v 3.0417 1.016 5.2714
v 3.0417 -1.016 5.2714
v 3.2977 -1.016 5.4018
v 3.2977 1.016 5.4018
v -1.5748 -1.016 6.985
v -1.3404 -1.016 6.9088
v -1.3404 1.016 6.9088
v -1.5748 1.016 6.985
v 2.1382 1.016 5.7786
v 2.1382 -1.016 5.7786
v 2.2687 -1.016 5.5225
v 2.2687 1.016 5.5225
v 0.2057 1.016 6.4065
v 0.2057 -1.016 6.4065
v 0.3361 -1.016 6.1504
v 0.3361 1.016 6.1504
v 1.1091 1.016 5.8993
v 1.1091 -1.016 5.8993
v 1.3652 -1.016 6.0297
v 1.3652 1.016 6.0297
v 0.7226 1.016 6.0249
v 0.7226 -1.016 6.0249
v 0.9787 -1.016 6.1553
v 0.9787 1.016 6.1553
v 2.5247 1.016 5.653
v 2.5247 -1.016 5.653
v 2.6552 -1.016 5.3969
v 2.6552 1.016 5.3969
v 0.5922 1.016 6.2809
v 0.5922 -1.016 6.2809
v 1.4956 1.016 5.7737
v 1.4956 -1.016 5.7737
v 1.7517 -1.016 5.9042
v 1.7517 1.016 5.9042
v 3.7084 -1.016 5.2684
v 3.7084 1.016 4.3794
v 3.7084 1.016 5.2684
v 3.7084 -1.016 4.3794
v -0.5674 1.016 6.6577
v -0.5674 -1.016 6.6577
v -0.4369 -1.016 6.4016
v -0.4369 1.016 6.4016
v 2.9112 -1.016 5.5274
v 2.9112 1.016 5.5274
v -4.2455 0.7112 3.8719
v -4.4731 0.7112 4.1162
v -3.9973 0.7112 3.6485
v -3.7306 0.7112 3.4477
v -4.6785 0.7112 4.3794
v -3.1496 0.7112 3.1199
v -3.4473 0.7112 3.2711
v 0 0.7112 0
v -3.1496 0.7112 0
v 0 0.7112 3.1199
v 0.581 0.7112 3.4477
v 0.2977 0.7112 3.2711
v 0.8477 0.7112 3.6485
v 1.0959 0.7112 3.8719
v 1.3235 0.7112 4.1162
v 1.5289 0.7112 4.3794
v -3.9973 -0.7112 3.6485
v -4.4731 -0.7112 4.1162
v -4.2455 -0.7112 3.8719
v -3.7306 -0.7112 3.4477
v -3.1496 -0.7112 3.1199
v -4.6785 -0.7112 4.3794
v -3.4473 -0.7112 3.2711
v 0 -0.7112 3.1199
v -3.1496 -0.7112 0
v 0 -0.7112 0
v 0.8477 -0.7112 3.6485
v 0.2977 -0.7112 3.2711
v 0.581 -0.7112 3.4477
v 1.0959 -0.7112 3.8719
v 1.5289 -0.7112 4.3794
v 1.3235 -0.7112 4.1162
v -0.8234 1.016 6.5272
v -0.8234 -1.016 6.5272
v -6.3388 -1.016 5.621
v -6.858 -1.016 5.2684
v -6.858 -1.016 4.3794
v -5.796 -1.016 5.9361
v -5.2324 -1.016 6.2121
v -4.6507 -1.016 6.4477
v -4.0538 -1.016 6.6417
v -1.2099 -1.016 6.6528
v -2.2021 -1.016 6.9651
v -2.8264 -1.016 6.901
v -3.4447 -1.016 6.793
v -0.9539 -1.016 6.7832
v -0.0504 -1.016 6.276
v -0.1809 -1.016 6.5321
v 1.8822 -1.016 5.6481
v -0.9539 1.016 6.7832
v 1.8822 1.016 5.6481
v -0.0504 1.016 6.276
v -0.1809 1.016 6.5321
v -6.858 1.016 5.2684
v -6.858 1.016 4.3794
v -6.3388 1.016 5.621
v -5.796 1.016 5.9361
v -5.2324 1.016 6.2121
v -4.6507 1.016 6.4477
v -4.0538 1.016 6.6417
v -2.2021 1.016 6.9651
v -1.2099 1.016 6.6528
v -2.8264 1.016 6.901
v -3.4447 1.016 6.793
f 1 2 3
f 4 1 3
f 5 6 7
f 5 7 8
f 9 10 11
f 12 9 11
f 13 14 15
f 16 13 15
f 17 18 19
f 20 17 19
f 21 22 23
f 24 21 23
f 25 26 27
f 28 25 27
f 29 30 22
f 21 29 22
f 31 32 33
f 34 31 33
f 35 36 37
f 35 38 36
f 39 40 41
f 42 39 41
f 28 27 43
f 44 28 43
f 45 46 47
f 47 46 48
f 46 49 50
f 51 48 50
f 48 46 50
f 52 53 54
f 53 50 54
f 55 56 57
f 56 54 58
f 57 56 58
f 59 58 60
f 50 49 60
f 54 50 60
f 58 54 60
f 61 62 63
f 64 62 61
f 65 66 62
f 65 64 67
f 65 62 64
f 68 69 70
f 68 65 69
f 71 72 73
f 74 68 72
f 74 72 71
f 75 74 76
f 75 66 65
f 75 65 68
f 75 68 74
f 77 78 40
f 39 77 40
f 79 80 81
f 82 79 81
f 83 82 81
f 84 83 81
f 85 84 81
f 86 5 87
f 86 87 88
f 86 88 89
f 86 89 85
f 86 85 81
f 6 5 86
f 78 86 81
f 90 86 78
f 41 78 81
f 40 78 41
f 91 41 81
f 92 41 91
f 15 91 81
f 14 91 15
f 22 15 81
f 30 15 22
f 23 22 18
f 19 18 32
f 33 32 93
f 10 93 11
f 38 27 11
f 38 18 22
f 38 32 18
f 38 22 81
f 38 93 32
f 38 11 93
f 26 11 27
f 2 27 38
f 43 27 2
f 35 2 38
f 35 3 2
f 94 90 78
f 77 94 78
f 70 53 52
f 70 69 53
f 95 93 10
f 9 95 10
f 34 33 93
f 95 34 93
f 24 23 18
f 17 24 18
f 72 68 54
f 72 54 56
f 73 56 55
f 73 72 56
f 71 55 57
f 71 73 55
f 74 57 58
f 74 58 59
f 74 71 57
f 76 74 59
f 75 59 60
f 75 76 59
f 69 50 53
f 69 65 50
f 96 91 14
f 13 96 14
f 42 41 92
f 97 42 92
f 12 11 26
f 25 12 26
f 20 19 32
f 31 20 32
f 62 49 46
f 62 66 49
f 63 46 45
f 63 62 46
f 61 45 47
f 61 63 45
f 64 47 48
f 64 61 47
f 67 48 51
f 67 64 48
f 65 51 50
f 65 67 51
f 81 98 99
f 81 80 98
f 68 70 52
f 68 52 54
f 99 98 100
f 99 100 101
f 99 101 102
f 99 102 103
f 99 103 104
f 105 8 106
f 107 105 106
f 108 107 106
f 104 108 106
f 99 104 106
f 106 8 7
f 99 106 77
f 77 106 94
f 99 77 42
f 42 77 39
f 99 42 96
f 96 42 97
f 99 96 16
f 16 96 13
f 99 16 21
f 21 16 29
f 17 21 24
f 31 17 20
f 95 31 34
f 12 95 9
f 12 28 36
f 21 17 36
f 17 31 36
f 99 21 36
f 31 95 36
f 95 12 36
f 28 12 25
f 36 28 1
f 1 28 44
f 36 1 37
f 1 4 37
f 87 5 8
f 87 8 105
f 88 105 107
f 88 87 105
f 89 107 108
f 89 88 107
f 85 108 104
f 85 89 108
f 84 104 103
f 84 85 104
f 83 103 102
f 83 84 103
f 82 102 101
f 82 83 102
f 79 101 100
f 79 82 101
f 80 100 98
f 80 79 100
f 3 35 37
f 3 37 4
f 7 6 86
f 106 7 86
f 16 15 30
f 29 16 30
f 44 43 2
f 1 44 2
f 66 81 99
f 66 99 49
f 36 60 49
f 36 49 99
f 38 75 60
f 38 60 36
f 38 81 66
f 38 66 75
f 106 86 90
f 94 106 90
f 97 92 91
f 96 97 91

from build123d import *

# Parameters (mm, degrees)
F1_DEPTH      = 1.016
F1_DEPTH_BACK = 1.016
F2_DEPTH      = 0.7112
F2_DEPTH_BACK = 0.7112
F4_DEPTH      = 25.4


with BuildPart() as f1:
    # F0 (on Front) → F1 (new body, two sides)
    with BuildSketch(Plane.XZ) as f1_sk:
        with BuildLine():
            Line((-4.6784887666, 4.3793842609), (1.5288887666, 4.3793842609))
            Line((1.5288887666, 4.3793842609), (3.7084, 4.3793842609))
            Line((3.7084, 4.3793842609), (3.7084, 5.2683842609))
            Line((3.7084, 5.2683842609), (-1.5748, 6.985))
            ThreePointArc((-1.5748, 6.985), (-4.3539247834, 6.5499498923), (-6.858, 5.2683842609))
            Line((-6.858, 5.2683842609), (-6.858, 4.3793842609))
            Line((-6.858, 4.3793842609), (-4.6784887666, 4.3793842609))
        make_face()
    extrude(amount=F1_DEPTH)
    extrude(f1_sk.sketch, amount=-F1_DEPTH_BACK)

    # F0 (on Front) → F2 (join, two sides)
    with BuildSketch(Plane.XZ) as f2_sk:
        with BuildLine():
            Line((-3.1496, 0), (0, 0))
            Line((0, 0), (0, 3.1198752576))
            ThreePointArc((0, 3.1198752576), (0.8477307051, 3.6485304249), (1.5288887666, 4.3793842609))
            Line((1.5288887666, 4.3793842609), (-4.6784887666, 4.3793842609))
            ThreePointArc((-4.6784887666, 4.3793842609), (-3.9973307051, 3.6485304249), (-3.1496, 3.1198752576))
            Line((-3.1496, 3.1198752576), (-3.1496, 0))
        make_face()
    extrude(amount=F2_DEPTH)
    extrude(f2_sk.sketch, amount=-F2_DEPTH_BACK)

    # F3 (on face) → F4 (cut)
    with BuildSketch(Plane.XZ.offset(1.016)):
        Polygon((-1.2099161613, 6.65278493), (-0.9538692542, 6.7832473707), (-1.3403786224, 6.9088318772), align=None)
        Polygon((-0.8234067931, 6.5272004235), (-0.567359886, 6.6576628642), (-0.9538692542, 6.7832473707), align=None)
        Polygon((-0.4368974248, 6.401615917), (-0.1808505177, 6.5320783577), (-0.567359886, 6.6576628642), align=None)
        Polygon((-0.0503880566, 6.2760314105), (0.2056588505, 6.4064938511), (-0.1808505177, 6.5320783577), align=None)
        Polygon((0.3361213116, 6.1504469039), (0.5921682187, 6.2809093446), (0.2056588505, 6.4064938511), align=None)
        Polygon((0.7226306798, 6.0248623974), (0.9786775869, 6.1553248381), (0.5921682187, 6.2809093446), align=None)
        Polygon((1.1091400481, 5.8992778909), (1.3651869552, 6.0297403316), (0.9786775869, 6.1553248381), align=None)
        Polygon((1.4956494163, 5.7736933844), (1.7516963234, 5.9041558251), (1.3651869552, 6.0297403316), align=None)
        Polygon((1.8821587845, 5.6481088779), (2.1382056916, 5.7785713186), (1.7516963234, 5.9041558251), align=None)
        Polygon((2.2686681527, 5.5225243714), (2.5247150598, 5.6529868121), (2.1382056916, 5.7785713186), align=None)
        Polygon((2.6551775209, 5.3969398649), (2.911224428, 5.5274023055), (2.5247150598, 5.6529868121), align=None)
        Polygon((3.0416868892, 5.2713553583), (3.2977337963, 5.401817799), (2.911224428, 5.5274023055), align=None)
    extrude(amount=-F4_DEPTH, mode=Mode.SUBTRACT)


solid = f1.part
